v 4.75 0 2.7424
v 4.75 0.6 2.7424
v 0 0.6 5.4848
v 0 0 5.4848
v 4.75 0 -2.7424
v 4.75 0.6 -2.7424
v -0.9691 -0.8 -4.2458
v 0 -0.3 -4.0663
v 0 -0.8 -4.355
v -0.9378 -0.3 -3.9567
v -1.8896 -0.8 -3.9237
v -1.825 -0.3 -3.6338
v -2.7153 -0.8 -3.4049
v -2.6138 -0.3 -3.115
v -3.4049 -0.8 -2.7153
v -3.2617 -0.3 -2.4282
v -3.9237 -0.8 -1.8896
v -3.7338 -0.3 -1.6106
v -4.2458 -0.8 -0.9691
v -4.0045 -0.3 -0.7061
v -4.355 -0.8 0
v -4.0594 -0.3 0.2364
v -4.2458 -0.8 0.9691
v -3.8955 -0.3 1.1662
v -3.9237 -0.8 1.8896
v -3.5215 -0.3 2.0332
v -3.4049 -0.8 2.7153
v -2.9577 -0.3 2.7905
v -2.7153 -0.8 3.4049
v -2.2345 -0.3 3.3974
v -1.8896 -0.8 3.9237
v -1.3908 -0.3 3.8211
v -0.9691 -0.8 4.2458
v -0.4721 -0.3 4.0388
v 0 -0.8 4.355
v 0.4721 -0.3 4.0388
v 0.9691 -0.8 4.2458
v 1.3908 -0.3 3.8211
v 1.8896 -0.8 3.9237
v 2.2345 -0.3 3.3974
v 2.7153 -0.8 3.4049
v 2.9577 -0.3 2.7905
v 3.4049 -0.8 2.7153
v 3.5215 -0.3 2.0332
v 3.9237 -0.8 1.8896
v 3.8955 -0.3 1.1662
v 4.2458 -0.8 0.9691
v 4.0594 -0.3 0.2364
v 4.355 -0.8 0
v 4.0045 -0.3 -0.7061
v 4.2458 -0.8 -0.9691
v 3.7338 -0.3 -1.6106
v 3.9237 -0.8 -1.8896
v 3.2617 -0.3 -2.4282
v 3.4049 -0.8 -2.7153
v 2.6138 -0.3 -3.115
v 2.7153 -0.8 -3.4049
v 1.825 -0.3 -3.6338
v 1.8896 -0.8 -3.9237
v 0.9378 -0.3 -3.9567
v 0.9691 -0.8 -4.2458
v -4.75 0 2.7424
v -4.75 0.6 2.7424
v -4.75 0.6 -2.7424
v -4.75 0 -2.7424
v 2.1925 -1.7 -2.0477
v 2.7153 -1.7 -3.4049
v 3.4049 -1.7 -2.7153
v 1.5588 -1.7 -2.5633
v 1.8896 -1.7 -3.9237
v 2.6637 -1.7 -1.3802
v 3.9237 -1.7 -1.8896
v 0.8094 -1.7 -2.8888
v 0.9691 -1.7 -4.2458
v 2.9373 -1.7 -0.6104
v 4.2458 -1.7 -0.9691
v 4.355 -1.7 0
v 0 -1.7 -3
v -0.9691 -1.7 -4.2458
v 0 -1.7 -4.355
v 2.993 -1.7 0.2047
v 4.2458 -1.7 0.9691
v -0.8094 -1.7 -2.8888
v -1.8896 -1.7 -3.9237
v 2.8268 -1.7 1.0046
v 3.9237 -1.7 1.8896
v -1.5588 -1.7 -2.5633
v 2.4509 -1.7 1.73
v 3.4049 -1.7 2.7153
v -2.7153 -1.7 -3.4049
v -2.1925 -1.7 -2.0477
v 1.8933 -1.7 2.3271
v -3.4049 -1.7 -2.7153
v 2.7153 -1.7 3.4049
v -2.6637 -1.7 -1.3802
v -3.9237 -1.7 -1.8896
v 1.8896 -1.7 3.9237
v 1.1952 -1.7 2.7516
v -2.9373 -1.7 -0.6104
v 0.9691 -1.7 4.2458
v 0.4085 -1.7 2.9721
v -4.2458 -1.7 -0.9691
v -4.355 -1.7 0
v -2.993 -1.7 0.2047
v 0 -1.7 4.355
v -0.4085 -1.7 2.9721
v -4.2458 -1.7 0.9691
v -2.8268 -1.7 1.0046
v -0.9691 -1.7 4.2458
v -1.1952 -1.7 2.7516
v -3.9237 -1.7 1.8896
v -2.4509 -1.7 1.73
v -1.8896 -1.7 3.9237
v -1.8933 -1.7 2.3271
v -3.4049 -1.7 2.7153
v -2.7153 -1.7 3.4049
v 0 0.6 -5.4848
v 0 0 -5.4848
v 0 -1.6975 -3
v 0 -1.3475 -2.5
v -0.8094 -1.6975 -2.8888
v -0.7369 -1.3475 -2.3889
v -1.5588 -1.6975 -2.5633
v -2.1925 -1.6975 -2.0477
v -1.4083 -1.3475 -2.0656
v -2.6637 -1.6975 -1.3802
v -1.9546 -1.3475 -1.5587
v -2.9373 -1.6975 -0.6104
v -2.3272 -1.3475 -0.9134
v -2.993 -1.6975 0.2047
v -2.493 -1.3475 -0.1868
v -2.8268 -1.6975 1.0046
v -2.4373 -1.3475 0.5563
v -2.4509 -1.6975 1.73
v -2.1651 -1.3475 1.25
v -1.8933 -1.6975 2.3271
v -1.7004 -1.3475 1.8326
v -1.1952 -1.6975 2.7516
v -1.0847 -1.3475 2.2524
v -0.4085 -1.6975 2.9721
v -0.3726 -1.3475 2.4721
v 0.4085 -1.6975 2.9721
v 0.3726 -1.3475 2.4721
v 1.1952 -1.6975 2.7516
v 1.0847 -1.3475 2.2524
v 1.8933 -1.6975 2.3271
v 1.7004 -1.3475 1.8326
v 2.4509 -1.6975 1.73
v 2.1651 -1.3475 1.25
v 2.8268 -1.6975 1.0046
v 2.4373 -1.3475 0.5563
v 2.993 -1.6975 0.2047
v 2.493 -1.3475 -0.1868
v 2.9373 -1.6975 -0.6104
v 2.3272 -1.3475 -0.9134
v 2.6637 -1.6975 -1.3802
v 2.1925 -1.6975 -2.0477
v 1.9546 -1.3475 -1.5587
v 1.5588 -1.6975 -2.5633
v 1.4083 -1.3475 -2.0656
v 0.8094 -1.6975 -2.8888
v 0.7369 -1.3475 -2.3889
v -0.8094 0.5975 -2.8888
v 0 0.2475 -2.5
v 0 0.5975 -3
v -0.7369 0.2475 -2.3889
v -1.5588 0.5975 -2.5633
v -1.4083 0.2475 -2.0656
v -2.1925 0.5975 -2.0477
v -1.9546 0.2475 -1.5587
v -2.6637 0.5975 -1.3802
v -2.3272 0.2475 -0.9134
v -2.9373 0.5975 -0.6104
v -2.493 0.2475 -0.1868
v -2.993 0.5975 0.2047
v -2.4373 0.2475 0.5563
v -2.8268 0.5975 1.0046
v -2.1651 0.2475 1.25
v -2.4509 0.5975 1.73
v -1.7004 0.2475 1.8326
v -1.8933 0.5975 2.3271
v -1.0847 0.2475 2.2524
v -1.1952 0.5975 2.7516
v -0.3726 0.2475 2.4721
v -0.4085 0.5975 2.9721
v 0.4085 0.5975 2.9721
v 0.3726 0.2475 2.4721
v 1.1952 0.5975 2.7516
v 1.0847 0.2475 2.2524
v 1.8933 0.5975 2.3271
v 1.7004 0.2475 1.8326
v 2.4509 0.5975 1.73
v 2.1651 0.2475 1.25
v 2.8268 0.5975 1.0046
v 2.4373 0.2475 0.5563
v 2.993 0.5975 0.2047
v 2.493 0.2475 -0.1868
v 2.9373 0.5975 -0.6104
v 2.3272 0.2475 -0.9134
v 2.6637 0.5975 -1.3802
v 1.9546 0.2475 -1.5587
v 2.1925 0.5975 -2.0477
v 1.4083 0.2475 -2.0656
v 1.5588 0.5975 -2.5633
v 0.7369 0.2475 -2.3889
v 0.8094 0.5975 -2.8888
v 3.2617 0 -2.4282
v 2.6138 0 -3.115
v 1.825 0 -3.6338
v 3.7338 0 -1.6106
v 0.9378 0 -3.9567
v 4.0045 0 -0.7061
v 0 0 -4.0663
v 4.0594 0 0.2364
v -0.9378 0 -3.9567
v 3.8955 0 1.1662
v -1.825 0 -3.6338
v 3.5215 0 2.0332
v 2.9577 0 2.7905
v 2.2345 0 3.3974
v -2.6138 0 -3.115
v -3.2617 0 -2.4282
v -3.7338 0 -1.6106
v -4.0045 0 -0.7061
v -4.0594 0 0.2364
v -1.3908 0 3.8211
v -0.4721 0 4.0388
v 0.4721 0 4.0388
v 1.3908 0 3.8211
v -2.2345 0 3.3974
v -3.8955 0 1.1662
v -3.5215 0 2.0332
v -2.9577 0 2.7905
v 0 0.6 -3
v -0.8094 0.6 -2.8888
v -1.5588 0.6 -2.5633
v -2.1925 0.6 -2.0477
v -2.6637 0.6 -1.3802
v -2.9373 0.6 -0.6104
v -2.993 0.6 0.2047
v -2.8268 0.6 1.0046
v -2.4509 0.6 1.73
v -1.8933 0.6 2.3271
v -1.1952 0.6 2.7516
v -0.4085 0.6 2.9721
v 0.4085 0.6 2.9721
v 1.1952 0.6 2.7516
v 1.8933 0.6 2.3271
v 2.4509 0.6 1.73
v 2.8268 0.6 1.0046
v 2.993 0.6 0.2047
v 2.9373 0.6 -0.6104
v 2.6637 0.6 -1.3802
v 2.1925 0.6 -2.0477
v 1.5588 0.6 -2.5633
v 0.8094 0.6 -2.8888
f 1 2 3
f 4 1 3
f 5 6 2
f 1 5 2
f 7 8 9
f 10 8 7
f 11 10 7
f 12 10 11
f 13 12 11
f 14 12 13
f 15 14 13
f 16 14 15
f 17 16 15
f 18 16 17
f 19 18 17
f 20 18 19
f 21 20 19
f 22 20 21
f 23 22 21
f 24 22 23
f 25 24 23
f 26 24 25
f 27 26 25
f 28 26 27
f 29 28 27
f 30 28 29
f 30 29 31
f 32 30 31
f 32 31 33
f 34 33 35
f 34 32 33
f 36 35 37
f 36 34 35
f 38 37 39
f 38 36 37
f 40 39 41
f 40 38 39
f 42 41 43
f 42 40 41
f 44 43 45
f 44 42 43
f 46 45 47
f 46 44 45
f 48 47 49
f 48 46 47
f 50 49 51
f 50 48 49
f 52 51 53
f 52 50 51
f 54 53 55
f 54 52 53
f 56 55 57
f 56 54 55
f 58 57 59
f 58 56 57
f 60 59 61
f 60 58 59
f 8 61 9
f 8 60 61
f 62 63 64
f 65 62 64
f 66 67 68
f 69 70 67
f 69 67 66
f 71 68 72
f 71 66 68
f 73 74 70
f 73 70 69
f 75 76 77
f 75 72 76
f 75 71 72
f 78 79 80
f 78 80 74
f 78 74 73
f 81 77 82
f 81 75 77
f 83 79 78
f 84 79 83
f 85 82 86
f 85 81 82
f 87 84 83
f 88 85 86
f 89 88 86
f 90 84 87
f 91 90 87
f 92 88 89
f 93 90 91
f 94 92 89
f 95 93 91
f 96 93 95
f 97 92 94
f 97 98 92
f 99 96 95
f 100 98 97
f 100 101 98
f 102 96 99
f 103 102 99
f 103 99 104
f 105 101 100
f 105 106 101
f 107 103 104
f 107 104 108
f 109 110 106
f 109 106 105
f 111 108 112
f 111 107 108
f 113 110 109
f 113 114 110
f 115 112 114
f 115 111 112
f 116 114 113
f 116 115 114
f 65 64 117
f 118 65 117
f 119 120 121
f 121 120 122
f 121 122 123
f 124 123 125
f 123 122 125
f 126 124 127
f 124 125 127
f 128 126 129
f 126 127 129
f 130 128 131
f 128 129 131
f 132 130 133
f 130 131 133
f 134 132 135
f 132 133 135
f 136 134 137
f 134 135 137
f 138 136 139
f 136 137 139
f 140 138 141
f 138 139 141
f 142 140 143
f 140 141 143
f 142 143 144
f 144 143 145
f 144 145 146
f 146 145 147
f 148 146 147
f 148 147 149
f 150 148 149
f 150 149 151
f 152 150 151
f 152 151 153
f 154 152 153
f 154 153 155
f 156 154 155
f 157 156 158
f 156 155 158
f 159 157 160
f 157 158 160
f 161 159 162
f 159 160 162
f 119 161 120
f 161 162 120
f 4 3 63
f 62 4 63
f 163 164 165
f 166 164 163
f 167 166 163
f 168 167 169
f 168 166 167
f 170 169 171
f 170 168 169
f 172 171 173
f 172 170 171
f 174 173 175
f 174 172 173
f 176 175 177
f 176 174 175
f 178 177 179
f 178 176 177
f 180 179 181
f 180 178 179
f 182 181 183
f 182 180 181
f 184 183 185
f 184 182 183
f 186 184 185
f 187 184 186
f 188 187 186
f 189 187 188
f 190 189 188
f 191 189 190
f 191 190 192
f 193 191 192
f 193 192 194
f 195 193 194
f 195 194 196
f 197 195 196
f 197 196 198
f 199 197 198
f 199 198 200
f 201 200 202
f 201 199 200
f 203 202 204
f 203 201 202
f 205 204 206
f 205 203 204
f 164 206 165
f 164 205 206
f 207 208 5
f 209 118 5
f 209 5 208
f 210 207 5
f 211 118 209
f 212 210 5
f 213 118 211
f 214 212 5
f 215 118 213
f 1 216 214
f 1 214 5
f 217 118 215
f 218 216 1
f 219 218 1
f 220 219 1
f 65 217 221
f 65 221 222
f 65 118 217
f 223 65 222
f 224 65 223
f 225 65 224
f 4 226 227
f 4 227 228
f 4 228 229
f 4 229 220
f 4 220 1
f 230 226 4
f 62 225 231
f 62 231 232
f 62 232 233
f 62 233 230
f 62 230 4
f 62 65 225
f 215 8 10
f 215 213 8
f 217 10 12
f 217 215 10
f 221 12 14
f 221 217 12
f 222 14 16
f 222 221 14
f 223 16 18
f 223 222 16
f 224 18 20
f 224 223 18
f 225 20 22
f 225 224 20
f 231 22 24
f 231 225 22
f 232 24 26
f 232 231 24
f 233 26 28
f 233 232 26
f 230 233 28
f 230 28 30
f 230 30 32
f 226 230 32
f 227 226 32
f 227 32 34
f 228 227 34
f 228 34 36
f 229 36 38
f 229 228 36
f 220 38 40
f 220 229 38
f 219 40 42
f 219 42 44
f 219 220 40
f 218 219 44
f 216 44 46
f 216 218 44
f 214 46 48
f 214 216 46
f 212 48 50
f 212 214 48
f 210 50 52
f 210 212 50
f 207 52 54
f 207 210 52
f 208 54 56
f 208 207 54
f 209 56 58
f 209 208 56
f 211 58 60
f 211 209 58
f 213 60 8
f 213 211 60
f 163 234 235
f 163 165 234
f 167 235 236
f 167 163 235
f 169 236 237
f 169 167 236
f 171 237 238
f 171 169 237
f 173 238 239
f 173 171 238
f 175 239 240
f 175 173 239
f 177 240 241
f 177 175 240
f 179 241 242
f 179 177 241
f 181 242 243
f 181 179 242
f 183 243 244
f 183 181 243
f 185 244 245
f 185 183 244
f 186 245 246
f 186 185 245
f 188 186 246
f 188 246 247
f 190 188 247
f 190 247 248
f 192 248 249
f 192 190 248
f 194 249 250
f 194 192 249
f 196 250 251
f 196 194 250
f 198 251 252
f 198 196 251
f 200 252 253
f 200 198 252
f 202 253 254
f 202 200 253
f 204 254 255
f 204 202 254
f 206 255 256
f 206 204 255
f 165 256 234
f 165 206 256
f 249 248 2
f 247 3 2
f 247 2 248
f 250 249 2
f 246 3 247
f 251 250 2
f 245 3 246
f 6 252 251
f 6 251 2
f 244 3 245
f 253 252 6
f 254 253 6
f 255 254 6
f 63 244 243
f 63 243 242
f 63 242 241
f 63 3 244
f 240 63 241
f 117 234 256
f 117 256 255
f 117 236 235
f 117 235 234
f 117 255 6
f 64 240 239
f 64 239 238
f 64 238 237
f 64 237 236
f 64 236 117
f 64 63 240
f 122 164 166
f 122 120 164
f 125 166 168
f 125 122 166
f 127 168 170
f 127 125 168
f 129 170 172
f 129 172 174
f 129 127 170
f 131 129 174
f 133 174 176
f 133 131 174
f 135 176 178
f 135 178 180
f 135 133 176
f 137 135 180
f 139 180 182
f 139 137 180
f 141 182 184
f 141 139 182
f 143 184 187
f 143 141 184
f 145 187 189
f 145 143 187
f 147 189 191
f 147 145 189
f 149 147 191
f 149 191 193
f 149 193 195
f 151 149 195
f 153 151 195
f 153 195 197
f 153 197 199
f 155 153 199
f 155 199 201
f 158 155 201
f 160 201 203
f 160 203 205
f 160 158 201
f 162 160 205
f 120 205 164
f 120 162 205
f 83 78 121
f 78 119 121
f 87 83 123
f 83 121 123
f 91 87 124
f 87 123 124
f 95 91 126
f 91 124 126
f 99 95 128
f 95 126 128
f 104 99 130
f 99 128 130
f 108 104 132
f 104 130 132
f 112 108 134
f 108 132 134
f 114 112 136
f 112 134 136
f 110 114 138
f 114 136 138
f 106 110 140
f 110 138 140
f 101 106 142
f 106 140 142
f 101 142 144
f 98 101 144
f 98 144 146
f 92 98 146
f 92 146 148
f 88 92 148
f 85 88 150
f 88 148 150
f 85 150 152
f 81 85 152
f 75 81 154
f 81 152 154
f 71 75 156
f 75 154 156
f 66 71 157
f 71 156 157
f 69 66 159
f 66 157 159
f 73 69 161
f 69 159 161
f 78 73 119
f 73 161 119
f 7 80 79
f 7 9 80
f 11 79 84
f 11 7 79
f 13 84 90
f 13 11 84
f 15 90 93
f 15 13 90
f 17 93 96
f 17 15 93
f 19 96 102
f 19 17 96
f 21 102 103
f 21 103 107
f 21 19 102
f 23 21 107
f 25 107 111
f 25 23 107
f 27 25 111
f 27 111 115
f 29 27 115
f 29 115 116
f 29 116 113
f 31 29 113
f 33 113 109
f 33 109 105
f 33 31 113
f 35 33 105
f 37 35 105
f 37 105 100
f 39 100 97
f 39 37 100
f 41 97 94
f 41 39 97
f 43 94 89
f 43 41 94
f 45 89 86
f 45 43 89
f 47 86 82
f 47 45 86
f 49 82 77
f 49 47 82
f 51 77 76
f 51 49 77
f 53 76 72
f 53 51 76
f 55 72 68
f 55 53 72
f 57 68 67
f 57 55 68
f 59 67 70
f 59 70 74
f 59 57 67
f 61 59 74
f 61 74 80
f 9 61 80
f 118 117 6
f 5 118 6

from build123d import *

# Parameters (mm, degrees)
HEXDIESKE_R  = 5.5105
HEXDIE_DEPTH = 0.6


with BuildPart() as part:
    # BodySke → Body (revolve)
    with BuildSketch(Plane.XY, mode=Mode.PRIVATE) as body_sk:
        Polygon((4.066324865, 0), (5.5095, 0), (5.5095, 0.6), (2.5, 0.6), (2.5, -1.7), (4.355, -1.7), (4.355, -0.8), (4.066324865, -0.3), align=None)
    revolve(body_sk.sketch.rotate(Axis((0, 0, 0), (0, 1, 0)), 90), axis=Axis((0, 0, 0), (0, 1, 0)))

    # EndChamferSke → EndChamfer (revolve, cut)
    with BuildSketch(Plane.XY, mode=Mode.PRIVATE) as endchamfer_sk:
        Polygon((3, -1.954), (3, -1.69746), (2.5, -1.347486267), (2.5, -1.954), align=None)
        Polygon((3, 0.59746), (2.5, 0.247486267), (2.5, 0.854), (3, 0.854), align=None)
    revolve(endchamfer_sk.sketch.rotate(Axis((0, -2.54, 0), (0, 1, 0)), 90), axis=Axis((0, -2.54, 0), (0, 1, 0)), mode=Mode.SUBTRACT)

    # HexDieSke → HexDie (cut)
    with BuildSketch(Plane(origin=(0, 0.6, 0), x_dir=(-1, 0, 0), z_dir=(0, 1, 0))):
        Circle(HEXDIESKE_R)
        Polygon((0, 5.484827557), (4.75, 2.742413779), (4.75, -2.742413779), (0, -5.484827557), (-4.75, -2.742413779), (-4.75, 2.742413779), align=None, mode=Mode.SUBTRACT)
    extrude(amount=-HEXDIE_DEPTH, mode=Mode.SUBTRACT)


solid = part.part
